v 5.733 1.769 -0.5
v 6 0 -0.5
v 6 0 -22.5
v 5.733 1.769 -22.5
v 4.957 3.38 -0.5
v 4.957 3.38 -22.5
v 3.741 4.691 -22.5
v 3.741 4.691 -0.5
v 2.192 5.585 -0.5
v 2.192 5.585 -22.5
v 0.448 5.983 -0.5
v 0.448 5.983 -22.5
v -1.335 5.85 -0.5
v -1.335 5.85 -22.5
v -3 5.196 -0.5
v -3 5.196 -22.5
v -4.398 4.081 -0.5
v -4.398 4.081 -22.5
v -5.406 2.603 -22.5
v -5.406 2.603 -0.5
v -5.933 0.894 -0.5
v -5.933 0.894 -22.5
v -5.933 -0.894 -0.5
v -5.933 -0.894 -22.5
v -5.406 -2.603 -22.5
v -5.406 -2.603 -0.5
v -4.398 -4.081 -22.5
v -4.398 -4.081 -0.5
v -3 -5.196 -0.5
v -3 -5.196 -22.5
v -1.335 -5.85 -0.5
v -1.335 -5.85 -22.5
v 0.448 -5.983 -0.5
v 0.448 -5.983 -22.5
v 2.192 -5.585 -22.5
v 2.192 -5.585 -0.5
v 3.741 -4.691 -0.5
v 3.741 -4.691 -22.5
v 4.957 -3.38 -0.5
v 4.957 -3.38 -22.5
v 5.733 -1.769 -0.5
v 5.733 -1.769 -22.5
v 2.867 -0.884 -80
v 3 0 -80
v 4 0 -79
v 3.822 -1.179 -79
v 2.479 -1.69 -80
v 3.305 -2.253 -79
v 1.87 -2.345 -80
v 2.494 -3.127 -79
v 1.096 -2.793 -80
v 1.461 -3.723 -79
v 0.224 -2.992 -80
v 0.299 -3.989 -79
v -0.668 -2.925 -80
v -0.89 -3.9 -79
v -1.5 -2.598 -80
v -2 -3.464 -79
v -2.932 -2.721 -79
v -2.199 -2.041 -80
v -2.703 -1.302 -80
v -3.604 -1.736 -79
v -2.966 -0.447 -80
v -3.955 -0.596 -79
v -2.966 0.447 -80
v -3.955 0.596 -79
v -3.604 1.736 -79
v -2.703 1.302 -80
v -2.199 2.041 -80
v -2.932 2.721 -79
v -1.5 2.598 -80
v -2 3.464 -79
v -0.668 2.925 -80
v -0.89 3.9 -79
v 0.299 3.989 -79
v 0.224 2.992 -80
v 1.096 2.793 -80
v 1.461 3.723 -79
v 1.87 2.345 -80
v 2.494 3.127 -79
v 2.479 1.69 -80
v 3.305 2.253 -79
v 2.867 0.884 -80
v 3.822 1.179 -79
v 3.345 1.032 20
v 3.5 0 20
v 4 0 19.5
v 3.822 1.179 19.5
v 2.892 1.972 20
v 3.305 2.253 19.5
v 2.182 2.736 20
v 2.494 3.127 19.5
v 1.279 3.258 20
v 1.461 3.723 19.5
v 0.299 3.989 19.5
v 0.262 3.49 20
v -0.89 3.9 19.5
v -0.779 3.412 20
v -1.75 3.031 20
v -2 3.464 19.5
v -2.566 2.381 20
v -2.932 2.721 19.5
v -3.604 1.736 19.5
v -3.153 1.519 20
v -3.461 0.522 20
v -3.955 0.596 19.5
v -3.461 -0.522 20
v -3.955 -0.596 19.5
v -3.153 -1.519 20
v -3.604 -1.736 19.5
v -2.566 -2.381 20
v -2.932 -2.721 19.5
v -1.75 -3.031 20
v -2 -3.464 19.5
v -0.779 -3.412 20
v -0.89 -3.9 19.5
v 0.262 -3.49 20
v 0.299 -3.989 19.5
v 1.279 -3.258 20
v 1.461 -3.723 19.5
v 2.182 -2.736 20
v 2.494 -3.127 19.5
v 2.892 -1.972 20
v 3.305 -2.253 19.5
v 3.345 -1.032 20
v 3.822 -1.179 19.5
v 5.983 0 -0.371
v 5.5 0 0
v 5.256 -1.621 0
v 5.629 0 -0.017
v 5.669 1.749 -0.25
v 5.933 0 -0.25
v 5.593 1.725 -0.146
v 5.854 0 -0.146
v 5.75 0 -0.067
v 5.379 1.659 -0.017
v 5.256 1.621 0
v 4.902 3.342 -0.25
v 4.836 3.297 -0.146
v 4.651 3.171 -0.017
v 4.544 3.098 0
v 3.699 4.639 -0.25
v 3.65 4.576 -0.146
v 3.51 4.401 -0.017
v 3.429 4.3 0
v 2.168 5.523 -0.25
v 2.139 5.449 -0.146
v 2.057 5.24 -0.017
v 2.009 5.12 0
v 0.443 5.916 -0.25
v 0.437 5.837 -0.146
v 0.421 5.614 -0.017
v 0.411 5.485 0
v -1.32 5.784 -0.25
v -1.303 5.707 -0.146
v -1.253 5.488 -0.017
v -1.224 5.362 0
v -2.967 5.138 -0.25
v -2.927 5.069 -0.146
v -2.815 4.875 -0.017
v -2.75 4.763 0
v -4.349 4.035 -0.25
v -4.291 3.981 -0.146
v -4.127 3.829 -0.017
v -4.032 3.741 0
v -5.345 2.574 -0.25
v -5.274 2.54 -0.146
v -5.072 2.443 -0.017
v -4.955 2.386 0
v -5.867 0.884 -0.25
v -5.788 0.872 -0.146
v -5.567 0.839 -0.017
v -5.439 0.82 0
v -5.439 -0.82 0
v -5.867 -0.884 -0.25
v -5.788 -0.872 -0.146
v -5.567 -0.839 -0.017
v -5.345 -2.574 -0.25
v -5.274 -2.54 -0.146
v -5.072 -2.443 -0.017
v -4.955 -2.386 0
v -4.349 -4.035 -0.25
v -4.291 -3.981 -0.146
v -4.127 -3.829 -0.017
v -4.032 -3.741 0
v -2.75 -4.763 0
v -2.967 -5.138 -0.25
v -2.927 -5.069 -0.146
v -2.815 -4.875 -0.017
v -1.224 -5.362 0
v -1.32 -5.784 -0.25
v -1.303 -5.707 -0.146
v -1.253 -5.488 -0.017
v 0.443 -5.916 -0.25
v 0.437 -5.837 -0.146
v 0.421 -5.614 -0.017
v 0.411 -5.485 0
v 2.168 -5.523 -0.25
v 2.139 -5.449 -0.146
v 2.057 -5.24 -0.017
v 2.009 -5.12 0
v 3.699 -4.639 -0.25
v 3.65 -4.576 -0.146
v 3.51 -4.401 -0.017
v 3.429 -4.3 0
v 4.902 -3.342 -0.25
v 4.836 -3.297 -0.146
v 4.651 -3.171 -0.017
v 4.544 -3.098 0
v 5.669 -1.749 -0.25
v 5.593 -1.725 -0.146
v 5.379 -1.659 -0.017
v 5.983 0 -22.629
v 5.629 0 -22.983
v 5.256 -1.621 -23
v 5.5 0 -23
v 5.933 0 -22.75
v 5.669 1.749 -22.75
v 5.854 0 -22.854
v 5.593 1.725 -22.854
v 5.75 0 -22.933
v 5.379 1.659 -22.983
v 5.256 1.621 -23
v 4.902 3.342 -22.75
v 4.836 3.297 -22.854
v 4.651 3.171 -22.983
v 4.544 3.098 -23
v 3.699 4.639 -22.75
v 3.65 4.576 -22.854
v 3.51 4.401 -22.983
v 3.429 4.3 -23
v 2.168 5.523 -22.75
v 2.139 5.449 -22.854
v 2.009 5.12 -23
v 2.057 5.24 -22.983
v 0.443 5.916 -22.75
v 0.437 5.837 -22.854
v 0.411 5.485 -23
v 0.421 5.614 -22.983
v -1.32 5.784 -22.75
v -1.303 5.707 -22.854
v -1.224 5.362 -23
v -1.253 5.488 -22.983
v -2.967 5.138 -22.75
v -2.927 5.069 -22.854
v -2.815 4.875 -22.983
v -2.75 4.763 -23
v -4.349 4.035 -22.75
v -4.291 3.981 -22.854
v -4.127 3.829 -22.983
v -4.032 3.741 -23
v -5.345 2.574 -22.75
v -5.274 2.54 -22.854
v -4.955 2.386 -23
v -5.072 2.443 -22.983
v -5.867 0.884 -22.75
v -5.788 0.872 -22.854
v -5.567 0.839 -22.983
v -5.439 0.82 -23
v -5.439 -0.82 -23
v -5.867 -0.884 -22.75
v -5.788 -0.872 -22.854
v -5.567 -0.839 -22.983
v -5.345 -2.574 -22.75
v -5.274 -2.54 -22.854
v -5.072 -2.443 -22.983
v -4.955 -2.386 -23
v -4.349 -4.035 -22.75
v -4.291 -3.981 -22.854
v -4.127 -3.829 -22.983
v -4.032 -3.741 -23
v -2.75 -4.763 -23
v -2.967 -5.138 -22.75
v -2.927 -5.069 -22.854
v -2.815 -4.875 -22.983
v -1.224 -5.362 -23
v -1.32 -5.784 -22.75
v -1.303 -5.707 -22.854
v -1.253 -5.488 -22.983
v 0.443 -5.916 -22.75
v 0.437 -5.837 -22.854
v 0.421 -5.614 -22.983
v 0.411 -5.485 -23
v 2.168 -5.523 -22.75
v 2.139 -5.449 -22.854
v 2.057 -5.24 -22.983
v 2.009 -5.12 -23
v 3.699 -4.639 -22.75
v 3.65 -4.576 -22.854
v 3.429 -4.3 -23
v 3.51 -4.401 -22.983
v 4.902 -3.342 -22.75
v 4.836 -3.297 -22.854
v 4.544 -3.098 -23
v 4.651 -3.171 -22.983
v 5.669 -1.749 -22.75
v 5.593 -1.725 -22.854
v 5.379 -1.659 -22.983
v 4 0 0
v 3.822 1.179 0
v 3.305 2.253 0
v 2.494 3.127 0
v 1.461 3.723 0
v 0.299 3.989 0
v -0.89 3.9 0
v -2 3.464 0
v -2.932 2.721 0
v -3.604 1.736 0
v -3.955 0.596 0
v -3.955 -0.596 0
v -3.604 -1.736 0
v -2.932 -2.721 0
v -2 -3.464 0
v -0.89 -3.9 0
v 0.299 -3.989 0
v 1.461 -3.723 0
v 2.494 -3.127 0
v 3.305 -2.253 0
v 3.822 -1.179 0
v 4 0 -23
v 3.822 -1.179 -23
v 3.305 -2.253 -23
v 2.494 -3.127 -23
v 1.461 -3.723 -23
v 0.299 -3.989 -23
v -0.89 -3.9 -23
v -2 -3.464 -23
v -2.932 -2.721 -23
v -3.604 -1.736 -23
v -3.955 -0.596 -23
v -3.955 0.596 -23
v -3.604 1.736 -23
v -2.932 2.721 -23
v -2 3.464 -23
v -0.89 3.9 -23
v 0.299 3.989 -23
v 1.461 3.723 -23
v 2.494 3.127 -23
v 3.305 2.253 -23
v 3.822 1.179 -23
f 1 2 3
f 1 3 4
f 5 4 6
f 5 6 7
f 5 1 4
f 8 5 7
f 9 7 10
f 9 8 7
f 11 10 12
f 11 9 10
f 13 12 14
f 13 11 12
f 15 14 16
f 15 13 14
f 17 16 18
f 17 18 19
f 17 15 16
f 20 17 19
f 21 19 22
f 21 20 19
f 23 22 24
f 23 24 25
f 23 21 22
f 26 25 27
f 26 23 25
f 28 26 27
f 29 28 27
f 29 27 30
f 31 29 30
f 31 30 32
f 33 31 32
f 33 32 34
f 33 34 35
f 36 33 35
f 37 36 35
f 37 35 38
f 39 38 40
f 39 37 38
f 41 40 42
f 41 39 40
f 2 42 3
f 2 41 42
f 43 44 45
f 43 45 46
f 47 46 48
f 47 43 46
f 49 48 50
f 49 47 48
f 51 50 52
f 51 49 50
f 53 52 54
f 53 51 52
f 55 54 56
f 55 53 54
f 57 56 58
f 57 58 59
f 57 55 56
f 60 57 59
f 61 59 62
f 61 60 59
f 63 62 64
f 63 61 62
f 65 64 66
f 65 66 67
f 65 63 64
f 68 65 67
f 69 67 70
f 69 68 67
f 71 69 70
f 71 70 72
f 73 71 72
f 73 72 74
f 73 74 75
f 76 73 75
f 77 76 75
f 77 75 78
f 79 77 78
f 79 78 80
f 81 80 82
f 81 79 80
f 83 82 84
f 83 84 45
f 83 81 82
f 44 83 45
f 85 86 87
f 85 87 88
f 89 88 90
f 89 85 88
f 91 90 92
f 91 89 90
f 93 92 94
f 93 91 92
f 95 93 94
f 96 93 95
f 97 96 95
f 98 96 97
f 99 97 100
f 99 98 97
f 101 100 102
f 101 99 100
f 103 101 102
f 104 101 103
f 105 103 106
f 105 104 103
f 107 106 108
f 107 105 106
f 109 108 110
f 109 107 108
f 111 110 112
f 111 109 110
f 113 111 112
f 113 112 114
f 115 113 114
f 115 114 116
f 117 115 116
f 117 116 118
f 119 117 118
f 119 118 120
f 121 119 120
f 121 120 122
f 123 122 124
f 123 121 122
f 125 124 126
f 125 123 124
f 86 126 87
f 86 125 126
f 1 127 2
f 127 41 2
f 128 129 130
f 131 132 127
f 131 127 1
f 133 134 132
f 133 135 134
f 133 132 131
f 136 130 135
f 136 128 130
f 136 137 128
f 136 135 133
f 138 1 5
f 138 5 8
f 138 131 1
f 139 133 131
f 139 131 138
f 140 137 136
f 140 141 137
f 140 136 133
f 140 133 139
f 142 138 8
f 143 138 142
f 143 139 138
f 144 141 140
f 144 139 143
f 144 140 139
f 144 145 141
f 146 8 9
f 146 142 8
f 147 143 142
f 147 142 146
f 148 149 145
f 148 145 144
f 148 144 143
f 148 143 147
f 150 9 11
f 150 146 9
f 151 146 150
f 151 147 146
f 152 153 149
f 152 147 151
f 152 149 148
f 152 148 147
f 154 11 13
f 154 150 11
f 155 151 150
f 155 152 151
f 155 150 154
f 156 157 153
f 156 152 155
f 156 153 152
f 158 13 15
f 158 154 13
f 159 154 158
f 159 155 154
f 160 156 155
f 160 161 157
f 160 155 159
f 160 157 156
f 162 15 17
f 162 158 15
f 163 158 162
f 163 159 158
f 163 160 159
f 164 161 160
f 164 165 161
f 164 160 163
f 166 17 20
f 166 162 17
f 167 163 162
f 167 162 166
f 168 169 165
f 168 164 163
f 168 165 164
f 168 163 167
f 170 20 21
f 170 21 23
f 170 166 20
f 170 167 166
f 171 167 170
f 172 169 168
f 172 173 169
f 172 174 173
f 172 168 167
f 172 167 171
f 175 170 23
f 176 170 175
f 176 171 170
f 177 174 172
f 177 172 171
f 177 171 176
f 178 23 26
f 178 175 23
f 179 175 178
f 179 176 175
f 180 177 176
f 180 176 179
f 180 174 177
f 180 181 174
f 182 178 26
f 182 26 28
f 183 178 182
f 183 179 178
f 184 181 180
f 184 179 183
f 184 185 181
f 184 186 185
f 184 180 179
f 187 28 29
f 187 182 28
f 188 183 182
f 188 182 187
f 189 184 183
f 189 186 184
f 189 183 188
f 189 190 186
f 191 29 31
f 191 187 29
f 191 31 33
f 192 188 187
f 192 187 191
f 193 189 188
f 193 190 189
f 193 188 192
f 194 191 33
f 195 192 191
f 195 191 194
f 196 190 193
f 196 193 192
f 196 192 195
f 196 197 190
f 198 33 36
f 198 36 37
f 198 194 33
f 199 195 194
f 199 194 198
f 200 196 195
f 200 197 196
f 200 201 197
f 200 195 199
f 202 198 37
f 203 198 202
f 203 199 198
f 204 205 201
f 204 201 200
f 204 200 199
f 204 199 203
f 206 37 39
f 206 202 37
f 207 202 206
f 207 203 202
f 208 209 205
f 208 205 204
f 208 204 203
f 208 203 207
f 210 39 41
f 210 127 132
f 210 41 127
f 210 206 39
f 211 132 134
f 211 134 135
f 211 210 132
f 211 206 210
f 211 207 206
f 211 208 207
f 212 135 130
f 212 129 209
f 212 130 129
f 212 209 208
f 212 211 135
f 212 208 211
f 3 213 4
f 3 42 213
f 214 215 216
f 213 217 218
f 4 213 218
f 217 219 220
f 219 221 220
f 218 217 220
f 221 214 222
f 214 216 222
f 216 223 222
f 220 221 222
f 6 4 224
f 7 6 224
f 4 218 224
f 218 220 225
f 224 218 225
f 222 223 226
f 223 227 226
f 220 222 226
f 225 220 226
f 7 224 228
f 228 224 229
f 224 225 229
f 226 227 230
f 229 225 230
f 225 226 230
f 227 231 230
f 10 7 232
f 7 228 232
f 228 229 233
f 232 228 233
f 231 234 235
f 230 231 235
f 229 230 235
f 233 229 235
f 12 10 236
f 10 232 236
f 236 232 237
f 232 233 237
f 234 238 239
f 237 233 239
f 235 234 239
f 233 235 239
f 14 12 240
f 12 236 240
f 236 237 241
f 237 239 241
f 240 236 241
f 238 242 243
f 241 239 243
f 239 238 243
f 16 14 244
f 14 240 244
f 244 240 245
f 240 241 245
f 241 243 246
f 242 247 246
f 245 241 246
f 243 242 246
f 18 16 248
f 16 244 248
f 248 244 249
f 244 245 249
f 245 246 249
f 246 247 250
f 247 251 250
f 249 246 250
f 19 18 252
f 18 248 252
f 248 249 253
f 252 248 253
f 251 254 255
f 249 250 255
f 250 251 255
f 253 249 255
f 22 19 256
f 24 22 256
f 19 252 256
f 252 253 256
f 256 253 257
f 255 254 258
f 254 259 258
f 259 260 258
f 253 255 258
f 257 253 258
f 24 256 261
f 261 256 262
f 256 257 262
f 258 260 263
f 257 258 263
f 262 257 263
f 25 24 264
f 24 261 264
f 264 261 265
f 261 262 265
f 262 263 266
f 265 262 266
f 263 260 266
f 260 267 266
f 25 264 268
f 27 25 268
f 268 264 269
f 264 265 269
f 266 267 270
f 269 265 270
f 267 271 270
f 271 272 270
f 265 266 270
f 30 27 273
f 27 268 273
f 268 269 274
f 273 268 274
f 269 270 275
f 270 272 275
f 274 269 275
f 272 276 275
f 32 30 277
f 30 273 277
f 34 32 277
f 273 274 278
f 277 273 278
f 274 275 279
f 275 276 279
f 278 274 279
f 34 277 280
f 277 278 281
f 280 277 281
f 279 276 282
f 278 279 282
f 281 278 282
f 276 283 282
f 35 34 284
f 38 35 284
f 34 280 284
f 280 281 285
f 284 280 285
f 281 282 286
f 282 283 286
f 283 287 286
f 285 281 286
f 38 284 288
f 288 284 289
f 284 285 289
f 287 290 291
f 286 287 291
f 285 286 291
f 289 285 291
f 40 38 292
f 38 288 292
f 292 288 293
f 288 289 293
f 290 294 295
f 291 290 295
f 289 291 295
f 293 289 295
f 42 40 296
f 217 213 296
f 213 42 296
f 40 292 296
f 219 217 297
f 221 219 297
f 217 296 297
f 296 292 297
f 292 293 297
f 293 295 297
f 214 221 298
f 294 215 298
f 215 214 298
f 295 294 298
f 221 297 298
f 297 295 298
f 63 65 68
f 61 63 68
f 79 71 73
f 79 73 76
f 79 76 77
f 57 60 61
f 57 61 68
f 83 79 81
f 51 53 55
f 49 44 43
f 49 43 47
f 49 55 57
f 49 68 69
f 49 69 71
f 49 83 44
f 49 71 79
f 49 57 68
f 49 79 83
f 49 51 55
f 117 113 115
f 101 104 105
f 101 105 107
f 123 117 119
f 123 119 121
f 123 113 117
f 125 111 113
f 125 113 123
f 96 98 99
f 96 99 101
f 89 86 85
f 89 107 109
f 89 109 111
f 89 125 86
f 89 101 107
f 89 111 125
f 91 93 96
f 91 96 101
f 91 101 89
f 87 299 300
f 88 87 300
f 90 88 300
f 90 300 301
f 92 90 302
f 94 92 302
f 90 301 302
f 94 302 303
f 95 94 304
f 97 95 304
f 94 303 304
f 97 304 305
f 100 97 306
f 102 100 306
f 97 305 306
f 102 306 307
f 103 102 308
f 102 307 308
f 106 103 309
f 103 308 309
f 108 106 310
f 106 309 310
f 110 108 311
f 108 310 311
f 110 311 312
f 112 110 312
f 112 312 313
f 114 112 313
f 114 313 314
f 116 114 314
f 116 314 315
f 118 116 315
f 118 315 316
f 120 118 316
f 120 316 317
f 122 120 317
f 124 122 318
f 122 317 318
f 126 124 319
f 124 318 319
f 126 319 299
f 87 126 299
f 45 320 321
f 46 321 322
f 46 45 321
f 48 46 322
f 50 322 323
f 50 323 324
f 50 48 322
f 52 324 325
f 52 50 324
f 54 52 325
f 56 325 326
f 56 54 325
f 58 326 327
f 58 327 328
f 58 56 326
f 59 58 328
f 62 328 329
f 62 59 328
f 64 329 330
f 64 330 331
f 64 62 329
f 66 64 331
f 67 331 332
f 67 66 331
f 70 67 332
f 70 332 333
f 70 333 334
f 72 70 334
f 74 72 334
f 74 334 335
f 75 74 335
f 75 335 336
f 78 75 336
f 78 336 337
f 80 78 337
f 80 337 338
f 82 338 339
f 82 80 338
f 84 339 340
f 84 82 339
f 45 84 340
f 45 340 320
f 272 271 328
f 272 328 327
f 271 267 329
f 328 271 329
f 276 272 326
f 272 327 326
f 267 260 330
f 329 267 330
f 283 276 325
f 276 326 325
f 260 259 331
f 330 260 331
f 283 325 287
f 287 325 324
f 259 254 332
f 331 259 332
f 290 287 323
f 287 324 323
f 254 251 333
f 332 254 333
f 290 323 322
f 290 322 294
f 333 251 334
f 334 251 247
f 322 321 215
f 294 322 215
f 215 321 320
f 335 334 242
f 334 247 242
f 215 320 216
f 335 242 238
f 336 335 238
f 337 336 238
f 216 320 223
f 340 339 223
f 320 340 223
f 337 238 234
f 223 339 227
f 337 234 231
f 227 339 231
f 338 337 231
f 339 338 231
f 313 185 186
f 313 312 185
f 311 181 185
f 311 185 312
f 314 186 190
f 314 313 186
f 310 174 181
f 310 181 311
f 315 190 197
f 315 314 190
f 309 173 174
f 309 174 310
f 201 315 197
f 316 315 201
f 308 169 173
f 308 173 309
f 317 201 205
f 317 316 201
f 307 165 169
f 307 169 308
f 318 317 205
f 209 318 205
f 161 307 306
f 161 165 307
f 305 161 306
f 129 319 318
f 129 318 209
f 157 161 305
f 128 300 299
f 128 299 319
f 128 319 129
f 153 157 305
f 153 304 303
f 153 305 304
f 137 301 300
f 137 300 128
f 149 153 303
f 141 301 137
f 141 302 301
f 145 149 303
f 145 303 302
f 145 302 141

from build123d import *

# Parameters (mm, degrees)
SKETCH_1_R      = 4
EXTRUDE_1_DEPTH = 20
SKETCH_2_R      = 6
EXTRUDE_2_DEPTH = 23
EXTRUDE_START   = 57
SKETCH_3_R      = 4
EXTRUDE_5_DEPTH = 57
CHAMFER_1_SIZE  = 1
CHAMFER_2_SIZE  = 0.5
FILLET_1_R      = 0.5
FILLET_2_R      = 0.5


with BuildPart() as part:
    # 草图1 → 凸台-拉伸1 (new body)
    with BuildSketch(Plane.XY):
        Circle(SKETCH_1_R)
    extrude(amount=EXTRUDE_1_DEPTH)

    # 草图2 → 凸台-拉伸2 (add)
    with BuildSketch(Plane.XY):
        Circle(SKETCH_2_R)
    extrude(amount=-EXTRUDE_2_DEPTH)

    # 草图3 → 凸台-拉伸5 (add)
    with BuildSketch(Plane(origin=(0, 0, -23), x_dir=(-1, 0, 0), z_dir=(0, 0, -1)).offset(EXTRUDE_START)):
        with Locations(Location((0, 0, 0), (0, 0, 180))):
            Circle(SKETCH_3_R)
    extrude(amount=-EXTRUDE_5_DEPTH)

    # 倒角1
    chamfer_1_edges = [part.edges().sort_by_distance(p)[0] for p in [
        (-4, 0, -80),
    ]]
    chamfer(chamfer_1_edges, length=CHAMFER_1_SIZE)

    # 倒角2
    chamfer_2_edges = [part.edges().sort_by_distance(p)[0] for p in [
        (-4, 0, 20),
    ]]
    chamfer(chamfer_2_edges, length=CHAMFER_2_SIZE)

    # 圆角1
    fillet_1_edges = [part.edges().sort_by_distance(p)[0] for p in [
        (-6, 0, -23),
    ]]
    fillet(fillet_1_edges, radius=FILLET_1_R)

    # 圆角2
    fillet_2_edges = [part.edges().sort_by_distance(p)[0] for p in [
        (-6, 0, 0),
    ]]
    fillet(fillet_2_edges, radius=FILLET_2_R)


solid = part.part
